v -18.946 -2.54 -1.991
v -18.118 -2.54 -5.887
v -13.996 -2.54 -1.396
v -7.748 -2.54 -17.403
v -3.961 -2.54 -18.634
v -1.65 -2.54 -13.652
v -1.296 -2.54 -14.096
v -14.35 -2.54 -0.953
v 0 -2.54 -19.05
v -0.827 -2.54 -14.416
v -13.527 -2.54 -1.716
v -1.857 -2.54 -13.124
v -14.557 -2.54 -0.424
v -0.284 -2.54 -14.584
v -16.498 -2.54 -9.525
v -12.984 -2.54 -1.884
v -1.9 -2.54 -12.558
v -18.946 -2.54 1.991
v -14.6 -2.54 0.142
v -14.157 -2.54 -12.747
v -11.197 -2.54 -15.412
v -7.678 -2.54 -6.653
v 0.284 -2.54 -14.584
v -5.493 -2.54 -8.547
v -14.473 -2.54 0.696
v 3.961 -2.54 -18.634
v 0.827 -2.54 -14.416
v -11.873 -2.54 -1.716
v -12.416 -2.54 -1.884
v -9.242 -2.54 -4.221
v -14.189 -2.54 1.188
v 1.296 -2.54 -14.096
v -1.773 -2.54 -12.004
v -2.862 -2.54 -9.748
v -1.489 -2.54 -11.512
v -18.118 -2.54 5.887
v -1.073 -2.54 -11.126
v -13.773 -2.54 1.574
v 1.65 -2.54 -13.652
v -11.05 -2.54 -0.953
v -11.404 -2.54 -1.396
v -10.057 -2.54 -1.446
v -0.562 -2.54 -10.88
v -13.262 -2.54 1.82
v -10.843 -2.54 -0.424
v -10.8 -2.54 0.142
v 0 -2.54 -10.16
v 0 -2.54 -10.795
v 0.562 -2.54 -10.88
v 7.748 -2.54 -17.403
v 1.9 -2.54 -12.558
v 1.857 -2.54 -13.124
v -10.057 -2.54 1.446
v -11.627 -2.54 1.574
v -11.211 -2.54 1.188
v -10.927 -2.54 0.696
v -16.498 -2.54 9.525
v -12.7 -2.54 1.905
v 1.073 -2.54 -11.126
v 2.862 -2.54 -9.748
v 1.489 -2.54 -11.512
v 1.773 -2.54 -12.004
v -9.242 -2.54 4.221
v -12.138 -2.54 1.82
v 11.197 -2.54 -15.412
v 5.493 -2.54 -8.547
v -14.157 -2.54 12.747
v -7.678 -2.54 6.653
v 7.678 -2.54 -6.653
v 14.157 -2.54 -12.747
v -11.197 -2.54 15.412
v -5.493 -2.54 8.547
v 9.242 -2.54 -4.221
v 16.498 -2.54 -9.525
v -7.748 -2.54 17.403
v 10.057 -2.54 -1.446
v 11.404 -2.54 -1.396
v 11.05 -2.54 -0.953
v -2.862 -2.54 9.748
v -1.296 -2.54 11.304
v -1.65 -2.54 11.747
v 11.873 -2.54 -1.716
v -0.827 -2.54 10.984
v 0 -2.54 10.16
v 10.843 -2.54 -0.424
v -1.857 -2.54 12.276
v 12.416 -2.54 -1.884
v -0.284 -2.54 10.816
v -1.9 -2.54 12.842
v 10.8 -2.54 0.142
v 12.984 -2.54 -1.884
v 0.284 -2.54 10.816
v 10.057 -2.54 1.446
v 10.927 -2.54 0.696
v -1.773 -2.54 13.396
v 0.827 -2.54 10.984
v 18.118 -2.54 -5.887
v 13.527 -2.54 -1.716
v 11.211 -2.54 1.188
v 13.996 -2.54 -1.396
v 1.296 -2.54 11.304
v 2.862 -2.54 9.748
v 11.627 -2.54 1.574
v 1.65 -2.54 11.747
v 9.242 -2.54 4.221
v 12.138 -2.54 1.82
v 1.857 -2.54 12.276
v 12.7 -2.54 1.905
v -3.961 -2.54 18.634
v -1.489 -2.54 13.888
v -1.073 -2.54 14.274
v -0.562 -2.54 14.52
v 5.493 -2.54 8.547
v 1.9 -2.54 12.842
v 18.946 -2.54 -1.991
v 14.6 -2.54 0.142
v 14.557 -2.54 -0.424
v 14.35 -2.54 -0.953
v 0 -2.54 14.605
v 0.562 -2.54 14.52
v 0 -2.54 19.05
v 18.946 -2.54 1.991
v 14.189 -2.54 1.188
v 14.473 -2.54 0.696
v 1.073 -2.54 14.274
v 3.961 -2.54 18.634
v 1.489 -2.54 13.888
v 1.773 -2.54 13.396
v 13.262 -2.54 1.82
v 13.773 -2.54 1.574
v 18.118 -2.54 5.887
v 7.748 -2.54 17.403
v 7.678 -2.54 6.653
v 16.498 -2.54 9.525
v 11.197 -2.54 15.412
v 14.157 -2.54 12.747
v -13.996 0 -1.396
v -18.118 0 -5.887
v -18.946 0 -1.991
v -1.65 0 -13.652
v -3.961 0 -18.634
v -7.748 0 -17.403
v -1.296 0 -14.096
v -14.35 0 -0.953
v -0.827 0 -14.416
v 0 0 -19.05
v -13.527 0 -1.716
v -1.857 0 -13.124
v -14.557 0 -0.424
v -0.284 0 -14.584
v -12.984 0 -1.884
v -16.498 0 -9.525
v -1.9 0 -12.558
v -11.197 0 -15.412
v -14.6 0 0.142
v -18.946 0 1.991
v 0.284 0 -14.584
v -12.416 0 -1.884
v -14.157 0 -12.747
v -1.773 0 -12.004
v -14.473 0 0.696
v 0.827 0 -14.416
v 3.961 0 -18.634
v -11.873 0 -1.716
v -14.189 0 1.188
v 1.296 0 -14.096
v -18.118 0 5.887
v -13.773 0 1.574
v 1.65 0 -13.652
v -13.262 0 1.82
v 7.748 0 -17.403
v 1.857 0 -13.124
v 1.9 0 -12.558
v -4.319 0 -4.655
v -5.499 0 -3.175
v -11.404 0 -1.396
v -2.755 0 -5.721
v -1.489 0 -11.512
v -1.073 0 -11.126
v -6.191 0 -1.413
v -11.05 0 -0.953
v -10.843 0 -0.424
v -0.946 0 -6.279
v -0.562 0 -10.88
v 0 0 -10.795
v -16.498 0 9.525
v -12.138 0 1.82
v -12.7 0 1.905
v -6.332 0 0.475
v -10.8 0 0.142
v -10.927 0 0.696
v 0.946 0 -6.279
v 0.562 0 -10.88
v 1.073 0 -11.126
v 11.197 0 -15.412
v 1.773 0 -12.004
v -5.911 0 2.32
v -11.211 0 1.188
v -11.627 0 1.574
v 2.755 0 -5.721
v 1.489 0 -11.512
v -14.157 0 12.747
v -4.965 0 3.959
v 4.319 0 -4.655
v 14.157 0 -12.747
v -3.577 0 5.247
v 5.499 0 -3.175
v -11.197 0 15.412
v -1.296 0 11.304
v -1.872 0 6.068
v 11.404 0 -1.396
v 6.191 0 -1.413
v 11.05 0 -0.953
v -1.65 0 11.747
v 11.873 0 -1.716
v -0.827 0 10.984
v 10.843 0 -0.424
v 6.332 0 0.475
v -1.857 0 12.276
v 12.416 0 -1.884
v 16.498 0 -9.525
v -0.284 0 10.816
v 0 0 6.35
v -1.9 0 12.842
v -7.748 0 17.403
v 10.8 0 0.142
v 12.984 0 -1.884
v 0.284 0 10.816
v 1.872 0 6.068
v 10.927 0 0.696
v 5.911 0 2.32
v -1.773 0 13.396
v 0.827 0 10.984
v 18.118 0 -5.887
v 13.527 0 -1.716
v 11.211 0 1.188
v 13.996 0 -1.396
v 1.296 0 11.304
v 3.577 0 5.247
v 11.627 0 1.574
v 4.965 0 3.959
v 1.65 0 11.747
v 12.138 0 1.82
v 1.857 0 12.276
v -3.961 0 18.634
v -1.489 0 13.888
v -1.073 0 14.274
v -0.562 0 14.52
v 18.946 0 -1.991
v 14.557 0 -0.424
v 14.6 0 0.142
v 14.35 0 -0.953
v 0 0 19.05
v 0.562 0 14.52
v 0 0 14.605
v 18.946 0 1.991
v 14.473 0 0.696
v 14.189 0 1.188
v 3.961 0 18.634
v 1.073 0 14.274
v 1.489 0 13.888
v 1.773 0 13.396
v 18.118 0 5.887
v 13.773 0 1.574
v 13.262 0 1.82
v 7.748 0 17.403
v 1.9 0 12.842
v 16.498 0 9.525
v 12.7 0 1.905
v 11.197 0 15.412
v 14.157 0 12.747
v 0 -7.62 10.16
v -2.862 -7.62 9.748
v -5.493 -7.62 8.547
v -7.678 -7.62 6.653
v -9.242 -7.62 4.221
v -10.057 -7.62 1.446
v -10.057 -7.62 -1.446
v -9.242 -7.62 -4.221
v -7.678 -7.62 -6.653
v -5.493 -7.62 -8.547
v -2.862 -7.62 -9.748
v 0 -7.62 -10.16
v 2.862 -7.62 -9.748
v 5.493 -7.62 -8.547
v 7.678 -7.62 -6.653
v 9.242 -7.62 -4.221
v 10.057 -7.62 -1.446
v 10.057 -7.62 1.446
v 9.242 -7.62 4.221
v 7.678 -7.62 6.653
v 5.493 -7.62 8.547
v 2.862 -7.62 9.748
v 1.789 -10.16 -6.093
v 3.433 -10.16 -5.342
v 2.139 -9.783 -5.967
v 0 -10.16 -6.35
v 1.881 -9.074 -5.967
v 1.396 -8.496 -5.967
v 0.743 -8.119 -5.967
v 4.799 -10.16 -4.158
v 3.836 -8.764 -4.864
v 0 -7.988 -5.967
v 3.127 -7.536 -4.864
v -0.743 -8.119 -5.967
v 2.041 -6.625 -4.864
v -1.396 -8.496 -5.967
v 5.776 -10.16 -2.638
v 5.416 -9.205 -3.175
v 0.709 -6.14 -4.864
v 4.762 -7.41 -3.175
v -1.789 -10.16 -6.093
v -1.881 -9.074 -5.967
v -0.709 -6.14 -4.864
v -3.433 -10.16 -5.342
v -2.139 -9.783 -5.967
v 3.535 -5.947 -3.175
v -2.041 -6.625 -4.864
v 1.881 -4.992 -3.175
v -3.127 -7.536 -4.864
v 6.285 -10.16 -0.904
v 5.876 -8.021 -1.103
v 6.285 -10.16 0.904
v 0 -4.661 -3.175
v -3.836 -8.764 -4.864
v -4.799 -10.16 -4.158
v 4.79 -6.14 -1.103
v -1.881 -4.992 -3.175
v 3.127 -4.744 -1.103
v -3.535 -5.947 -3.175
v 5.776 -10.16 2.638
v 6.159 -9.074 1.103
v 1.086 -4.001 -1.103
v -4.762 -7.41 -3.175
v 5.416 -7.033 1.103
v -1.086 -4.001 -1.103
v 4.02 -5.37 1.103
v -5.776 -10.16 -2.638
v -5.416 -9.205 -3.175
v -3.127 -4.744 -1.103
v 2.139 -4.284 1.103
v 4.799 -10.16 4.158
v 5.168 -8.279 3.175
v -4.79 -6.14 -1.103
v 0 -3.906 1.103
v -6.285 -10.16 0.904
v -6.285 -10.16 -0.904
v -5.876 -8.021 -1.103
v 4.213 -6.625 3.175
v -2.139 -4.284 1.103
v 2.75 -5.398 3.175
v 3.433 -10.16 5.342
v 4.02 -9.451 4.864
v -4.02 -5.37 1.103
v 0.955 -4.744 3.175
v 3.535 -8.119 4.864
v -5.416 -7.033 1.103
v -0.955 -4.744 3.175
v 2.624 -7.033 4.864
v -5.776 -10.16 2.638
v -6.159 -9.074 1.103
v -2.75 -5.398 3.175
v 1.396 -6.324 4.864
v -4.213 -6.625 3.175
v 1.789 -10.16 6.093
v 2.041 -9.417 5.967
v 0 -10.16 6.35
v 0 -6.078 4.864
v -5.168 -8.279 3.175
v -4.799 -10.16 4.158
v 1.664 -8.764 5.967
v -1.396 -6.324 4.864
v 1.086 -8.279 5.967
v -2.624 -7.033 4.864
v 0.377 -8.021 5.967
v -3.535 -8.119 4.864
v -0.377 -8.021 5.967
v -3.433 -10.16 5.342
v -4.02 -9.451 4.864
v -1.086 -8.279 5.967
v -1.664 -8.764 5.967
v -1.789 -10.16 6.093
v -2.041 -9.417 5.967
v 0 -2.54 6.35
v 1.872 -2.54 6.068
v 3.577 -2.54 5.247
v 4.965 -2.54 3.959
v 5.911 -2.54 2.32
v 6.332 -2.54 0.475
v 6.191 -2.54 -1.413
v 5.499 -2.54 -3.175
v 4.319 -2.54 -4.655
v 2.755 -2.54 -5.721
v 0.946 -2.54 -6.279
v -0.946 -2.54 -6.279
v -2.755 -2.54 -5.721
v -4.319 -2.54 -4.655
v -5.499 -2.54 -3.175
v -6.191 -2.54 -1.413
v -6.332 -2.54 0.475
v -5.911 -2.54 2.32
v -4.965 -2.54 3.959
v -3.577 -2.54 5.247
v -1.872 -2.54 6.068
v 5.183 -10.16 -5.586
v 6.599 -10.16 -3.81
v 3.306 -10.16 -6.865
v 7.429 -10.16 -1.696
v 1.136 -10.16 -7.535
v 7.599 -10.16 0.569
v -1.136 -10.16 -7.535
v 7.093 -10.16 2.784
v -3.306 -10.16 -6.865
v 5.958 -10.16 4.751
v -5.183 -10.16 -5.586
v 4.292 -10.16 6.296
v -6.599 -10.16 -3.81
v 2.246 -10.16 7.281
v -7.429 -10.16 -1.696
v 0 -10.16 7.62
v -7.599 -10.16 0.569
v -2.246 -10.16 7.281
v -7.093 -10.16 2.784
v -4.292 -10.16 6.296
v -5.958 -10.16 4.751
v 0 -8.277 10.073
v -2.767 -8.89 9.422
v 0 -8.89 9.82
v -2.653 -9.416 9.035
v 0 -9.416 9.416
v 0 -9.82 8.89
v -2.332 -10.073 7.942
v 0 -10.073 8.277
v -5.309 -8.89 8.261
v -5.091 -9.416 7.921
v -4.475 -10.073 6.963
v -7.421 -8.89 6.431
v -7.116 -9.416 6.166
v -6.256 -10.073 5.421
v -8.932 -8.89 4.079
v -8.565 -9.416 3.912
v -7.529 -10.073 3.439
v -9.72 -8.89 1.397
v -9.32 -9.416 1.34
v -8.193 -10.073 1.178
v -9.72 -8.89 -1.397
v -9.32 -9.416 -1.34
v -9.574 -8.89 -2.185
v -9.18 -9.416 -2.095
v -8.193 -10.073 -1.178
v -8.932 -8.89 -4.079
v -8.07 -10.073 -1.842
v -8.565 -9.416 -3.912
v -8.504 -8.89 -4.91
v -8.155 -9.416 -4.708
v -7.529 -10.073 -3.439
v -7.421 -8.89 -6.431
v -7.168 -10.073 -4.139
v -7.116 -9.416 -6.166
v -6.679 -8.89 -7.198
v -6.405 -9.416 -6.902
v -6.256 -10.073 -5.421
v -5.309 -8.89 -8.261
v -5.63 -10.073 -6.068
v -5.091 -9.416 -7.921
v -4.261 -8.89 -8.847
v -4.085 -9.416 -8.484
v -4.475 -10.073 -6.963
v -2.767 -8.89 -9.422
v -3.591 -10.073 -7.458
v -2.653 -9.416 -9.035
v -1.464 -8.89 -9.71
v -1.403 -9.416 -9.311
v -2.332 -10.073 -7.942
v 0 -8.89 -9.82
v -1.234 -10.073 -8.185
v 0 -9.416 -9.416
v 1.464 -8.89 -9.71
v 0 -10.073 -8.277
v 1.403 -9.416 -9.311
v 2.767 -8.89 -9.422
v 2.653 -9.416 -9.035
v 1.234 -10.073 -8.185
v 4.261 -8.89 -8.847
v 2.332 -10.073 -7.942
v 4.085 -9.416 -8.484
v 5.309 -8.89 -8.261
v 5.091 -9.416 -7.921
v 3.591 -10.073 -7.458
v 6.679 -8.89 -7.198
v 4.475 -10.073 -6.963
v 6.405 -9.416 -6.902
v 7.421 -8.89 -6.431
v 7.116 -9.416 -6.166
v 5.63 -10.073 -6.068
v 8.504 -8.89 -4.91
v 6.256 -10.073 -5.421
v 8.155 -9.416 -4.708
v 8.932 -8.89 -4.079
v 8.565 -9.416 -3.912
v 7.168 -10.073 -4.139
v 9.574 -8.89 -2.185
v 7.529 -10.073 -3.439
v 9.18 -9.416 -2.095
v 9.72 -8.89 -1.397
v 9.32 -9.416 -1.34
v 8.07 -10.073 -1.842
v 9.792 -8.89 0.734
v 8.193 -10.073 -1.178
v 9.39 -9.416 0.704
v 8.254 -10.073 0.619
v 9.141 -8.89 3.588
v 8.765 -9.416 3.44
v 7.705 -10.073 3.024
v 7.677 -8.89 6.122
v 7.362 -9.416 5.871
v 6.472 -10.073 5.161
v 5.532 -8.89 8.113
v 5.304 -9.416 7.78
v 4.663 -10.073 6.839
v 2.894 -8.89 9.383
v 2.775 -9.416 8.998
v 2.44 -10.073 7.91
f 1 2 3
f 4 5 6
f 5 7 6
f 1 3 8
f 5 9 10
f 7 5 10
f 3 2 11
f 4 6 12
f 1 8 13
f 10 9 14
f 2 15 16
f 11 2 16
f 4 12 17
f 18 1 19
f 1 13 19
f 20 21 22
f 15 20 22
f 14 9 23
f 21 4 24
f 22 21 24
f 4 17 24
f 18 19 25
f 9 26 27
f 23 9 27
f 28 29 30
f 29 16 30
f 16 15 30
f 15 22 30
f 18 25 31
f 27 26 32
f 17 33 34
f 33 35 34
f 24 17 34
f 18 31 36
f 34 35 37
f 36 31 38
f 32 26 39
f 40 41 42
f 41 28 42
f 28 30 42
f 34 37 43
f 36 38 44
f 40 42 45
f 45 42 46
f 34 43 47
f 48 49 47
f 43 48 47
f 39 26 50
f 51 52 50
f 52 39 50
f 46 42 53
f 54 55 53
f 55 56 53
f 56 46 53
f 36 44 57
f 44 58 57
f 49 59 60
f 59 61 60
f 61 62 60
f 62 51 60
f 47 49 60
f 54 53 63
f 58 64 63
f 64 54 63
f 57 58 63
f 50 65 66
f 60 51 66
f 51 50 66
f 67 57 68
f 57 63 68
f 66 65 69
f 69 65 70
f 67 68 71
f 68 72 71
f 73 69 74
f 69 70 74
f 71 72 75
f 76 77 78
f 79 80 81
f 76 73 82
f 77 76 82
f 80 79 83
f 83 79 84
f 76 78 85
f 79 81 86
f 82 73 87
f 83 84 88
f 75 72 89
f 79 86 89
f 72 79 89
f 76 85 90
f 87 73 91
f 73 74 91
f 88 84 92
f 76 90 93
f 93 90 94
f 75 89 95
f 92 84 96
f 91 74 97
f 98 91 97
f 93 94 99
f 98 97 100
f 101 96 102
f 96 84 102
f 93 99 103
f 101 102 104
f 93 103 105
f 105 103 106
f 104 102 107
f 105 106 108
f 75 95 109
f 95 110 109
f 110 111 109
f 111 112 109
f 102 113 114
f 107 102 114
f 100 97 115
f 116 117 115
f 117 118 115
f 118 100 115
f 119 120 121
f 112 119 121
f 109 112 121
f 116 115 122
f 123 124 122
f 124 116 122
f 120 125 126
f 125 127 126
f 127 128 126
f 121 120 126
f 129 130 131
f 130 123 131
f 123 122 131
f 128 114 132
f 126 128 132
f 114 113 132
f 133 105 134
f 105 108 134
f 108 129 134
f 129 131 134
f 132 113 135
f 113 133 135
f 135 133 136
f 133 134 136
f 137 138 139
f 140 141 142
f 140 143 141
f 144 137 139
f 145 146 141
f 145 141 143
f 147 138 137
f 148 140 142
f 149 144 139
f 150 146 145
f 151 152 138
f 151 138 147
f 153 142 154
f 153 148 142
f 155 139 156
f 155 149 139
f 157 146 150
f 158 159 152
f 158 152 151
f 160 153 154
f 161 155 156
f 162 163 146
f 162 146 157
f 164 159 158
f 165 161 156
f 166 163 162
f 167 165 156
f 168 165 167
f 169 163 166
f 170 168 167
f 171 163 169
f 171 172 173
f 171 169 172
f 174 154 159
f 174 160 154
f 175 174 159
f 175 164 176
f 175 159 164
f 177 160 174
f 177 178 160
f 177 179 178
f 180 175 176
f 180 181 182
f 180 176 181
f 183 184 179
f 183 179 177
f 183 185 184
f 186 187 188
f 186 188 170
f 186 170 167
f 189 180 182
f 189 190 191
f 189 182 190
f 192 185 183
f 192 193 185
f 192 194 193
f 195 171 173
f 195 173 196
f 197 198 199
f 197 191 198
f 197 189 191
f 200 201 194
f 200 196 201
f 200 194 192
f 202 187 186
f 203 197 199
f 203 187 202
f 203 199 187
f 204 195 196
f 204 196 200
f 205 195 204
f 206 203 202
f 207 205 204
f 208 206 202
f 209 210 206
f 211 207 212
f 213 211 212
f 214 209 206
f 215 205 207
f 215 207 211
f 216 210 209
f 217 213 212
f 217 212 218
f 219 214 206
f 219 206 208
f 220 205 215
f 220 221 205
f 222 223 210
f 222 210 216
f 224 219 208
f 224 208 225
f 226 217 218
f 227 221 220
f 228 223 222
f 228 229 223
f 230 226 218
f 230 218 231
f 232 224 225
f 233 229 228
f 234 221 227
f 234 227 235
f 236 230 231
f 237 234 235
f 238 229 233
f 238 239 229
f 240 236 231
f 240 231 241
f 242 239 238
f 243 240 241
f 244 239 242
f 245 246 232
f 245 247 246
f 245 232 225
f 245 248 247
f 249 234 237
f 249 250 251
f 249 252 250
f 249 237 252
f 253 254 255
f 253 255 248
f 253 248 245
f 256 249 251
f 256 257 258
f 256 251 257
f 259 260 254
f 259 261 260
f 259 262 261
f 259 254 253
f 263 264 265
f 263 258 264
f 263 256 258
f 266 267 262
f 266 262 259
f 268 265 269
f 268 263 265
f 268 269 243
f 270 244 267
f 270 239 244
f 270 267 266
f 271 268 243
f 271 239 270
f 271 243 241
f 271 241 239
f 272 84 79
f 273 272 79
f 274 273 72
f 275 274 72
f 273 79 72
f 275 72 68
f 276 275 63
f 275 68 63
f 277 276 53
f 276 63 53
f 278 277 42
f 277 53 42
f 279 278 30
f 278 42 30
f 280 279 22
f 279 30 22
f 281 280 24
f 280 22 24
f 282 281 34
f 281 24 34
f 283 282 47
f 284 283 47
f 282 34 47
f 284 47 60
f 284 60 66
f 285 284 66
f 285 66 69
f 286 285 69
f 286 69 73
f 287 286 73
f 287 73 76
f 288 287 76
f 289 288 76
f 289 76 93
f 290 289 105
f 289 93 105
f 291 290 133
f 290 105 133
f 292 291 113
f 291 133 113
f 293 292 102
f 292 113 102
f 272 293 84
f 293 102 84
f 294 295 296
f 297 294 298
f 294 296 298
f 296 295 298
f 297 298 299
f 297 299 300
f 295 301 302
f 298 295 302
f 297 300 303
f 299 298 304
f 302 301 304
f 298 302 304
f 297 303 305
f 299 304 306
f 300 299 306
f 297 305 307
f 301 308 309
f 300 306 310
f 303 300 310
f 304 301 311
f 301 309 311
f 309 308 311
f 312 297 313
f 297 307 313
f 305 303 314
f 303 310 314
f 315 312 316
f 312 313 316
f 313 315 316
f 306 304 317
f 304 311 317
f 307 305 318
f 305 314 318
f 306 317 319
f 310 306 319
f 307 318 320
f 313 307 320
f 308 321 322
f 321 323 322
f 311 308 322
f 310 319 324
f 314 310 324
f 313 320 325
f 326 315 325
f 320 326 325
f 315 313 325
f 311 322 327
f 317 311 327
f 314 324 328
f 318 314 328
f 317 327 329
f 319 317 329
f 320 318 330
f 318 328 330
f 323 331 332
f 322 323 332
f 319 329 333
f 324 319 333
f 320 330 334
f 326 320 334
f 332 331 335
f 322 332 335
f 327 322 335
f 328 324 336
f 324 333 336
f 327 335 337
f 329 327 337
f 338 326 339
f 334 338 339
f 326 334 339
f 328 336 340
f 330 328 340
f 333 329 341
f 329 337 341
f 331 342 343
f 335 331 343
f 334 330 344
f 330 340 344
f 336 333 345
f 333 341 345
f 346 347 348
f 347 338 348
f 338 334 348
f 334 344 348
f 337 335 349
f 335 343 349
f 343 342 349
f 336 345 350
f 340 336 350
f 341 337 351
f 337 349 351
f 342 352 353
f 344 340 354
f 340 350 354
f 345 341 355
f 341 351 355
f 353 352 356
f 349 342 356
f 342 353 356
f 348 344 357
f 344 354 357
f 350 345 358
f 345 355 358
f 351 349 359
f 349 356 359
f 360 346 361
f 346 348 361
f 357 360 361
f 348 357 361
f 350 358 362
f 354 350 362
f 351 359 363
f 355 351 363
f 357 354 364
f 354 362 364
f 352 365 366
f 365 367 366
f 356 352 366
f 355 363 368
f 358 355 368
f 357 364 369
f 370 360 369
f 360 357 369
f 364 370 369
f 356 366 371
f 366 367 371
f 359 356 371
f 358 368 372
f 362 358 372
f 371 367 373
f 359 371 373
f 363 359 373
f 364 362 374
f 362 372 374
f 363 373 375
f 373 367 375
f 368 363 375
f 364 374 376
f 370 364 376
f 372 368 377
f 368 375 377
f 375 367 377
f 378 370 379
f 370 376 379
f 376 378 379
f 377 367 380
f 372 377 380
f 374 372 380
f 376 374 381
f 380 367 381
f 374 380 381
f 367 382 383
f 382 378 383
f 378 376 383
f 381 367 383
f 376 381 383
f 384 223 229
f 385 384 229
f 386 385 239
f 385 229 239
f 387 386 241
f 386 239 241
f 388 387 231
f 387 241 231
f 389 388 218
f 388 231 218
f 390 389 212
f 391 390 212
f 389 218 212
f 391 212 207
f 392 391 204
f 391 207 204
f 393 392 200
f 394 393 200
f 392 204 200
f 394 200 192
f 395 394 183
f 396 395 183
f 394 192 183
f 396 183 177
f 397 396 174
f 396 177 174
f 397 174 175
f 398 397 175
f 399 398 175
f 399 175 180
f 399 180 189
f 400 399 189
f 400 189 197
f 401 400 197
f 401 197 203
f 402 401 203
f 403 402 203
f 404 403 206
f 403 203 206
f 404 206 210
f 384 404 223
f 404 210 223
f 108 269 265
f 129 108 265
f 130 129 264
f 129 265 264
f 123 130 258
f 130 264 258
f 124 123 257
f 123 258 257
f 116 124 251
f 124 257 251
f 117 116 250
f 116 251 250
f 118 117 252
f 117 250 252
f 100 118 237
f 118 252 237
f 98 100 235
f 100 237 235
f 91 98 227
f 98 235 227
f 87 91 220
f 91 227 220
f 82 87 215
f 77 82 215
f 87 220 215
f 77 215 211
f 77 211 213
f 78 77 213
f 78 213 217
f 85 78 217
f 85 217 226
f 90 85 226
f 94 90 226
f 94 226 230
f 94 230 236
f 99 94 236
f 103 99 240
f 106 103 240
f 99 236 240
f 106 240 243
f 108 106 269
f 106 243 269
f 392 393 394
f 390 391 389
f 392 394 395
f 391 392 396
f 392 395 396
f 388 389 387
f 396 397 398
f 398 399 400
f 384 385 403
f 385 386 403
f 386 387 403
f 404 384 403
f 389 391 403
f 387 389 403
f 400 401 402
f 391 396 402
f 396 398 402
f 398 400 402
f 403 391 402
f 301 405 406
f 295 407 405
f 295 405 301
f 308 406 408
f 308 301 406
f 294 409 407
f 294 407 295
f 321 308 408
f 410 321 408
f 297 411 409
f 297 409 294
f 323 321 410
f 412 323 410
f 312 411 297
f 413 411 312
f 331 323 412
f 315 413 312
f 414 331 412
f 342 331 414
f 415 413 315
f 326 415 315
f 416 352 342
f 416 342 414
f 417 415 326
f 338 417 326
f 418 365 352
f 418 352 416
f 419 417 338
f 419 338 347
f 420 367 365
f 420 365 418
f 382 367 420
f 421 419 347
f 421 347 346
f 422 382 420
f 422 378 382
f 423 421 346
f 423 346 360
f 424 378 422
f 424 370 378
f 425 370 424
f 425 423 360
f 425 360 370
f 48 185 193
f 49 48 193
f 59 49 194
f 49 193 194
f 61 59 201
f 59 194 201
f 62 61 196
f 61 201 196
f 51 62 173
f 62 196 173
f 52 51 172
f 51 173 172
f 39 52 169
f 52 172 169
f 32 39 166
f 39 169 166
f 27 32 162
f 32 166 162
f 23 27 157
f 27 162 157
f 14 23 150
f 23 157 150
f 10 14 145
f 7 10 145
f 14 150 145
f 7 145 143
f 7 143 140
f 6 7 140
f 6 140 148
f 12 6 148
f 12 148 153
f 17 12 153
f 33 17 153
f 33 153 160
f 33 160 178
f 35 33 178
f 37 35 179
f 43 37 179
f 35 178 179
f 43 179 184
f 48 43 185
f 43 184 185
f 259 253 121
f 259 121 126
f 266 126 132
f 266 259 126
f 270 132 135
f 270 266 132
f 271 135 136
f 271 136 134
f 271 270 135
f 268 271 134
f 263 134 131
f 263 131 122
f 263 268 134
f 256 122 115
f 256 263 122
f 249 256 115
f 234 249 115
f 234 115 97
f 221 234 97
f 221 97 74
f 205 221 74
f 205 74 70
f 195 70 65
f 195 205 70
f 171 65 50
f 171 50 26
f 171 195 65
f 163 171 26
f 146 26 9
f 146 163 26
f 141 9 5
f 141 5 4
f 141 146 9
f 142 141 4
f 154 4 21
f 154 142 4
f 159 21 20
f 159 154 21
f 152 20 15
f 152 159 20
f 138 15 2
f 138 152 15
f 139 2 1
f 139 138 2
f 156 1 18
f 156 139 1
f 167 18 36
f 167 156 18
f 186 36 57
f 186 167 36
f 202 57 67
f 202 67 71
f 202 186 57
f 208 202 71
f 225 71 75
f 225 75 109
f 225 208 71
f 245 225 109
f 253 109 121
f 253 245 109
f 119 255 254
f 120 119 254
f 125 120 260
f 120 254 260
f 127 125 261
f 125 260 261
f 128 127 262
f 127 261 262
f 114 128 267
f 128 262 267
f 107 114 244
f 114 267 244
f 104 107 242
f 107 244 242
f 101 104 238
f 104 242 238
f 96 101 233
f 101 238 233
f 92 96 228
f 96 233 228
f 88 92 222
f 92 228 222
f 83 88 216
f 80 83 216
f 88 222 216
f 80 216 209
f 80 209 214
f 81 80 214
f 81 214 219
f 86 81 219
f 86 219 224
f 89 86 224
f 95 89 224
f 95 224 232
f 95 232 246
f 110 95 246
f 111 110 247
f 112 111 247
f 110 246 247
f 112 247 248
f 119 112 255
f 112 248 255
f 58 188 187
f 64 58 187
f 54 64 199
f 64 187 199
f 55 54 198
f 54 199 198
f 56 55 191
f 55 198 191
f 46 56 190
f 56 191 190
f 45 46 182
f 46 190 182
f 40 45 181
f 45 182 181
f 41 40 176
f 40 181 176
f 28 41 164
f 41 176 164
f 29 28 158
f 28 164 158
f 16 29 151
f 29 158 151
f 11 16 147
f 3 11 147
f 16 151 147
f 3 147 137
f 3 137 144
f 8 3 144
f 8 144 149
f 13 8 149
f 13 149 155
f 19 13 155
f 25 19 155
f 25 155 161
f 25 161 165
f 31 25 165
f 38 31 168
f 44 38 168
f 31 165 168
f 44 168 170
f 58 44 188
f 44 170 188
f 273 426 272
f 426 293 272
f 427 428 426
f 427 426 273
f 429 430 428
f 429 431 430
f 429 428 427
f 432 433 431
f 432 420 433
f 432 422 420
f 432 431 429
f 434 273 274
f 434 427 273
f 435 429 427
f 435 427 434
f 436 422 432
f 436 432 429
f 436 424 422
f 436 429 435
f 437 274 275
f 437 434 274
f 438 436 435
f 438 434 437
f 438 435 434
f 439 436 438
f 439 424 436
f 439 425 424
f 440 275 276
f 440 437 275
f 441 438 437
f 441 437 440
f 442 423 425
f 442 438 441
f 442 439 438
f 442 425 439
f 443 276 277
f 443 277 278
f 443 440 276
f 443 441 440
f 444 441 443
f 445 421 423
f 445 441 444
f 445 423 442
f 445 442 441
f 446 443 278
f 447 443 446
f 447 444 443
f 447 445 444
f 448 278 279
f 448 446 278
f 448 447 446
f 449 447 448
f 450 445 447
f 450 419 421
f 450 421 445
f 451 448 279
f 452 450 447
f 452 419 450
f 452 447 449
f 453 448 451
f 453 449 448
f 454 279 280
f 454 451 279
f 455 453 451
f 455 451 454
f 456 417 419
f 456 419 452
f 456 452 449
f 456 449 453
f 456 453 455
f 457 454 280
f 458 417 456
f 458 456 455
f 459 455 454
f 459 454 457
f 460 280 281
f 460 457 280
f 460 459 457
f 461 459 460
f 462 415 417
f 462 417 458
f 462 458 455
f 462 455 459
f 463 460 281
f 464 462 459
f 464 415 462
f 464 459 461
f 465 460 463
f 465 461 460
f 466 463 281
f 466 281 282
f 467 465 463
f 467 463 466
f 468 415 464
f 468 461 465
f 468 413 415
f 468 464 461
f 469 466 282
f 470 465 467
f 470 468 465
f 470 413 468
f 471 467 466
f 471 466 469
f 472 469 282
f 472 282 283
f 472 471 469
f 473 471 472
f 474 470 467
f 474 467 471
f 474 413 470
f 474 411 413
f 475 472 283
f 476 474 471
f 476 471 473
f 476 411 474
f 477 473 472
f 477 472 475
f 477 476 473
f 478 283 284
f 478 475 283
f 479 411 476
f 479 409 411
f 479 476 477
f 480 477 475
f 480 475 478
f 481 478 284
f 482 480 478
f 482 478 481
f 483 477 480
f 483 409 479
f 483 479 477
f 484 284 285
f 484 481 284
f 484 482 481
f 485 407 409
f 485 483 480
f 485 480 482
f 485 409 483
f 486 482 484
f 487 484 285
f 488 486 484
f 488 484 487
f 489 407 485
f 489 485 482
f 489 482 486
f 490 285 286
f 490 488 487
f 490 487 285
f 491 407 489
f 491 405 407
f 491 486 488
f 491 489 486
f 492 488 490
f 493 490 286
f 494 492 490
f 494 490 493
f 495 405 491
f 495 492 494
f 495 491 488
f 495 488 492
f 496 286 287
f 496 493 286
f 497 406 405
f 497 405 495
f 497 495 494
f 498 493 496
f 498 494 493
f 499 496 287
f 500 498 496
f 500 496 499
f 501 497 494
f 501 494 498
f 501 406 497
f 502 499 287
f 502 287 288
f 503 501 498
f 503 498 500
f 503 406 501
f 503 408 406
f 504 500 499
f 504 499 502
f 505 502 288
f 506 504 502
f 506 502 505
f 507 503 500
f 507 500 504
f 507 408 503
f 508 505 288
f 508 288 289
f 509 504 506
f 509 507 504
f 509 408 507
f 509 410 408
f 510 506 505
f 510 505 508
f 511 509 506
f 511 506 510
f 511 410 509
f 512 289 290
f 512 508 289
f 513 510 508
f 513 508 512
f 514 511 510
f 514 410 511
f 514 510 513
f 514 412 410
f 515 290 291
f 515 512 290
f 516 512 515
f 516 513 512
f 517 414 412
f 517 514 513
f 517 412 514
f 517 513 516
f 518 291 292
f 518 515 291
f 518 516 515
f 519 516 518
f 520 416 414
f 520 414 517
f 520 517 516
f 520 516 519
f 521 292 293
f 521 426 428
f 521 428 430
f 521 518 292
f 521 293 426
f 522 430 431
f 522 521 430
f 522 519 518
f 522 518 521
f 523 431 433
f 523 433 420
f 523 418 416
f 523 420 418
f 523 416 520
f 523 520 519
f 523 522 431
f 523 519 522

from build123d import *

# Parameters (mm, degrees)
SKETCH2_R           = 19.05
SKETCH2_R_2         = 6.35
SKETCH2_R_3         = 1.905
BOSS_EXTRUDE1_DEPTH = 2.54
SKETCH3_R           = 10.16
BOSS_EXTRUDE2_DEPTH = 7.62
FILLET1_R           = 2.54


with BuildPart() as part:
    # Sketch2 → Boss-Extrude1 (new body)
    with BuildSketch(Plane(origin=(0, 0, 0), x_dir=(1, 0, 0), z_dir=(0, 1, 0))):
        with Locations(Location((0, 0, 0), (0, 0, 270))):
            Circle(SKETCH2_R)
        with Locations(Location((0, 0, 0), (0, 0, 270))):
            Circle(SKETCH2_R_2, mode=Mode.SUBTRACT)
        with Locations(Location((0, 12.7, 0), (0, 0, 270))):
            Circle(SKETCH2_R_3, mode=Mode.SUBTRACT)
        with Locations(Location((12.7, 0, 0), (0, 0, 270))):
            Circle(SKETCH2_R_3, mode=Mode.SUBTRACT)
        with Locations(Location((0, -12.7, 0), (0, 0, 270))):
            Circle(SKETCH2_R_3, mode=Mode.SUBTRACT)
        with Locations(Location((-12.7, 0, 0), (0, 0, 270))):
            Circle(SKETCH2_R_3, mode=Mode.SUBTRACT)
    extrude(amount=-BOSS_EXTRUDE1_DEPTH)

    # Sketch3 → Boss-Extrude2 (add)
    with BuildSketch(Plane.XZ.offset(2.54)):
        with Locations(Location((0, 0, 0), (0, 0, 90))):
            Circle(SKETCH3_R)
    extrude(amount=BOSS_EXTRUDE2_DEPTH)

    # Fillet1
    fillet1_edges = [part.edges().sort_by_distance(p)[0] for p in [
        (0, -10.16, -10.16),
    ]]
    fillet(fillet1_edges, radius=FILLET1_R)


with BuildPart() as body_2:
    # Sketch5 → Revolve1 (revolve)
    with BuildSketch(Plane.XZ.offset(10.16)):
        with BuildLine():
            Line((0, 6.35), (0, -6.35))
            ThreePointArc((0, -6.35), (6.35, 0), (0, 6.35))
        make_face()
    revolve(axis=Axis((0, -10.16, -11.766022755), (0, 0, 1)))


with BuildPart() as part_1:
    add(part.part)

    # Combine1: cut body 2
    add(body_2.part, mode=Mode.SUBTRACT)


solid = part_1.part
